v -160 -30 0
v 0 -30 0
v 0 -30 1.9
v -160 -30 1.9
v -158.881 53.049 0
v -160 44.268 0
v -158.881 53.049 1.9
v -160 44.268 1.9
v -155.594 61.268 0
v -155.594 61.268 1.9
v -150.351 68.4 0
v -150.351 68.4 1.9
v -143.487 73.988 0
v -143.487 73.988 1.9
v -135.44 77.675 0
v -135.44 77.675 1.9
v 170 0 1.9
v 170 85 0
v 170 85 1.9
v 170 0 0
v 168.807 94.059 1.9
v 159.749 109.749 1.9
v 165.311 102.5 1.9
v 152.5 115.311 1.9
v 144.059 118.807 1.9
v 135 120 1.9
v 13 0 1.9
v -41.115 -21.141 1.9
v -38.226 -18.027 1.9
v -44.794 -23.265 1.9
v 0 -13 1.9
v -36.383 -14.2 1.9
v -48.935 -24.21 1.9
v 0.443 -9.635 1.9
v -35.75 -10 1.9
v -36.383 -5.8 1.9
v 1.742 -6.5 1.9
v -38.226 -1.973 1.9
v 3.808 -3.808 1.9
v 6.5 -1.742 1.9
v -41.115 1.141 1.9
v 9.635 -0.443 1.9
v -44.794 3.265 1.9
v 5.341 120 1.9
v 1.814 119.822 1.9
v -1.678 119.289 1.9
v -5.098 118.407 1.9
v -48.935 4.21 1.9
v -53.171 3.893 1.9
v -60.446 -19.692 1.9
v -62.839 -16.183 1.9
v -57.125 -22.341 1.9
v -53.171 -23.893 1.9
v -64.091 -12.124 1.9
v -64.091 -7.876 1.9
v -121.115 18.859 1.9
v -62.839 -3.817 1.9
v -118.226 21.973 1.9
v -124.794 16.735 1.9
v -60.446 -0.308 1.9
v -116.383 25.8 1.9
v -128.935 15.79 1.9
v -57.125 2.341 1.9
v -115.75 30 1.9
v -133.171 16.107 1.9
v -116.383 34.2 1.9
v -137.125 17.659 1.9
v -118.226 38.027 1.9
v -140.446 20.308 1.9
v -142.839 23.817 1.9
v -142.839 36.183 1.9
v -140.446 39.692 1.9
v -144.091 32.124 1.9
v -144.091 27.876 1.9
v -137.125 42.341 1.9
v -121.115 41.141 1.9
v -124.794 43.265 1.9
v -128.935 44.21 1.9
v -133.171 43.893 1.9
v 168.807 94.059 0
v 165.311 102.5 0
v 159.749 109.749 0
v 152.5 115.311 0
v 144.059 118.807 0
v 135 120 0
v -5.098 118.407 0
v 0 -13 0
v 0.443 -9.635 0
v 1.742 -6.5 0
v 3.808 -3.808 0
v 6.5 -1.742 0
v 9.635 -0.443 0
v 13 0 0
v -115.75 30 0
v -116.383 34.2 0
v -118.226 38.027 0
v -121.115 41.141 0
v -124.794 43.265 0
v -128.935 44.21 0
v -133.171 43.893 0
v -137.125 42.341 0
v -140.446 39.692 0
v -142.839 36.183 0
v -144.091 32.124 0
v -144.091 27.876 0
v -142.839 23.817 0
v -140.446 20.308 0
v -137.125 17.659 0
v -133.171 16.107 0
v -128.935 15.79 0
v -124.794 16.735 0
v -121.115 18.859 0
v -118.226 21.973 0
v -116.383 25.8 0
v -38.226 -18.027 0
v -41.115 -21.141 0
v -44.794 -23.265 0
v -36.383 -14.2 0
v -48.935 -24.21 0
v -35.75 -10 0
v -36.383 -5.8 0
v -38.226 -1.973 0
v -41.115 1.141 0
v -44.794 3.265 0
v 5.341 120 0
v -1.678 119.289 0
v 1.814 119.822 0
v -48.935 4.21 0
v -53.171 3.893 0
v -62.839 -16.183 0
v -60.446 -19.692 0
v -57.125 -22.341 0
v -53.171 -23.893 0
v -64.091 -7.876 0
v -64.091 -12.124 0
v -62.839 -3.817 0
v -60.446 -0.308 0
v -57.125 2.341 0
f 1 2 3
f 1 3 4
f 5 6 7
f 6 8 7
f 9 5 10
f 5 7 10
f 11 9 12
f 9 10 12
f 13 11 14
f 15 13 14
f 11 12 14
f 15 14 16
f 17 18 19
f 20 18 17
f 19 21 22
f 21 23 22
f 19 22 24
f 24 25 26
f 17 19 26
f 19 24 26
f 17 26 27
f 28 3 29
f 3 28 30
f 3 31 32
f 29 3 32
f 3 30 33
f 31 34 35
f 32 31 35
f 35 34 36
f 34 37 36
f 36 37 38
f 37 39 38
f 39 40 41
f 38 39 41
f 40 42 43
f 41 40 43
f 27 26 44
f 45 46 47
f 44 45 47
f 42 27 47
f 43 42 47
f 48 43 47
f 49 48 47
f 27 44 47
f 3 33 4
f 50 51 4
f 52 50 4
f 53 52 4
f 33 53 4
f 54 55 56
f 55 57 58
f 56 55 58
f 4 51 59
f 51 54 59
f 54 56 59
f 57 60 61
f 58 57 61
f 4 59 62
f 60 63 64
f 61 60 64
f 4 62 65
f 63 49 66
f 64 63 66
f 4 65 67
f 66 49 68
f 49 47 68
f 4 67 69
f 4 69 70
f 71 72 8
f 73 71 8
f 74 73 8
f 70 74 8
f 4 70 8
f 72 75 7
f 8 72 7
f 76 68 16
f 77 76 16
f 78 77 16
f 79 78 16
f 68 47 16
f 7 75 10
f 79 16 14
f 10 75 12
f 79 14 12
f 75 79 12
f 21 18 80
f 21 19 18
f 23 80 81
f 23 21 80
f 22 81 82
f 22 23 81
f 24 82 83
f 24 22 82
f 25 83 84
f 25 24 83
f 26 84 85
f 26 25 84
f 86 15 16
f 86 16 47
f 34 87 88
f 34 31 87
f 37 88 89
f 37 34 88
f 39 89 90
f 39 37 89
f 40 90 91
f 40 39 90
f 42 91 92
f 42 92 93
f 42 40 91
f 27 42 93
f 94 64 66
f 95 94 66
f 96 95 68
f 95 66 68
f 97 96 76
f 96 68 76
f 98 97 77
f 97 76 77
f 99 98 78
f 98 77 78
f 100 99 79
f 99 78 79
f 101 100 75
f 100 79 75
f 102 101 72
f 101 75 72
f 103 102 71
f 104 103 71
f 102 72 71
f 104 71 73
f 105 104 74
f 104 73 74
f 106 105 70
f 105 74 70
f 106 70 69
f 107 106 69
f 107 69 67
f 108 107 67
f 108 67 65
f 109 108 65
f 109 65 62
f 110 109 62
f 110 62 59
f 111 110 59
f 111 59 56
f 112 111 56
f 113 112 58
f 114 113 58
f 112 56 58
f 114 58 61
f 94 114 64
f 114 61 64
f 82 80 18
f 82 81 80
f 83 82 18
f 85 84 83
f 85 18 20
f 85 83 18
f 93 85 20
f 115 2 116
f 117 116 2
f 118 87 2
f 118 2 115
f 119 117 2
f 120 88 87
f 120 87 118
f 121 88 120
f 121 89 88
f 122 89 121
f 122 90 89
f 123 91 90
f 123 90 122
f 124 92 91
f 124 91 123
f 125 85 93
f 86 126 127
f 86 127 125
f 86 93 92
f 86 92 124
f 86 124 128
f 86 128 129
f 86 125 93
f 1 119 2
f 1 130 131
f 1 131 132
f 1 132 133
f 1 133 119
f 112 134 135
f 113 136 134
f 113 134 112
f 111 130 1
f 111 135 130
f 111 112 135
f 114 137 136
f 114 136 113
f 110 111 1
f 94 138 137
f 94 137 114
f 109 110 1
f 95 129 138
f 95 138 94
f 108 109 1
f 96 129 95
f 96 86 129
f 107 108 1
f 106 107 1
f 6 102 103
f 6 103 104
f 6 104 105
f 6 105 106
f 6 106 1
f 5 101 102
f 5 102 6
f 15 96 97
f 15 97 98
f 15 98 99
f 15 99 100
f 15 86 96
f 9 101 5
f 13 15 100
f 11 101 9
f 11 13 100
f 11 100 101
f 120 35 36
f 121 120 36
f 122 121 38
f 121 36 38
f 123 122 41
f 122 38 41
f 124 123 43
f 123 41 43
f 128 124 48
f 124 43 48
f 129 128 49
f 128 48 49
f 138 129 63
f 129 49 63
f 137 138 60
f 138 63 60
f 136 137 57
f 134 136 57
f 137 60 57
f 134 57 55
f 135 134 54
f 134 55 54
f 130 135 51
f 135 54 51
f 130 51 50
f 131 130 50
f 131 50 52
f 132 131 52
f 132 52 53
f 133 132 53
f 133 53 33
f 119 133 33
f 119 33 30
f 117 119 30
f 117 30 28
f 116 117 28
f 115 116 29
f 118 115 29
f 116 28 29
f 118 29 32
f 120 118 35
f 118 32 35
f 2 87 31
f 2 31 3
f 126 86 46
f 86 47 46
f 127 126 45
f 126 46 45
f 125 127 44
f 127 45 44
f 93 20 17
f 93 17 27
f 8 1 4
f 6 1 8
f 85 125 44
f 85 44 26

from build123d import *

# Parameters (mm, degrees)
RESSALTO_EXTRUS_O1_DEPTH = 1.9
ESBO_O2_R                = 14.25
CORTE_EXTRUS_O1_DEPTH    = 1.9
FILETE1_R                = 13
FILETE2_R                = 35


with BuildPart() as part:
    # Esboço1 → Ressalto-extrusão1 (new body)
    with BuildSketch(Plane.XY):
        Polygon((-160, 70), (0, 120), (170, 120), (170, 0), (0, 0), (0, -30), (-160, -30), align=None)
    extrude(amount=RESSALTO_EXTRUS_O1_DEPTH)

    # Esboço2 → Corte-extrusão1 (cut)
    with BuildSketch(Plane.XY.offset(1.9)):
        with Locations((-50, -10)):
            Circle(ESBO_O2_R)
        with Locations((-130, 30)):
            Circle(ESBO_O2_R)
    extrude(amount=-CORTE_EXTRUS_O1_DEPTH, mode=Mode.SUBTRACT)

    # Filete1
    filete1_edges = [part.edges().sort_by_distance(p)[0] for p in [
        (0, 0, 0.95),
    ]]
    fillet(filete1_edges, radius=FILETE1_R)

    # Filete2
    filete2_edges = [part.edges().sort_by_distance(p)[0] for p in [
        (-160, 70, 0.95),
        (0, 120, 0.95),
        (170, 120, 0.95),
    ]]
    fillet(filete2_edges, radius=FILETE2_R)


solid = part.part
